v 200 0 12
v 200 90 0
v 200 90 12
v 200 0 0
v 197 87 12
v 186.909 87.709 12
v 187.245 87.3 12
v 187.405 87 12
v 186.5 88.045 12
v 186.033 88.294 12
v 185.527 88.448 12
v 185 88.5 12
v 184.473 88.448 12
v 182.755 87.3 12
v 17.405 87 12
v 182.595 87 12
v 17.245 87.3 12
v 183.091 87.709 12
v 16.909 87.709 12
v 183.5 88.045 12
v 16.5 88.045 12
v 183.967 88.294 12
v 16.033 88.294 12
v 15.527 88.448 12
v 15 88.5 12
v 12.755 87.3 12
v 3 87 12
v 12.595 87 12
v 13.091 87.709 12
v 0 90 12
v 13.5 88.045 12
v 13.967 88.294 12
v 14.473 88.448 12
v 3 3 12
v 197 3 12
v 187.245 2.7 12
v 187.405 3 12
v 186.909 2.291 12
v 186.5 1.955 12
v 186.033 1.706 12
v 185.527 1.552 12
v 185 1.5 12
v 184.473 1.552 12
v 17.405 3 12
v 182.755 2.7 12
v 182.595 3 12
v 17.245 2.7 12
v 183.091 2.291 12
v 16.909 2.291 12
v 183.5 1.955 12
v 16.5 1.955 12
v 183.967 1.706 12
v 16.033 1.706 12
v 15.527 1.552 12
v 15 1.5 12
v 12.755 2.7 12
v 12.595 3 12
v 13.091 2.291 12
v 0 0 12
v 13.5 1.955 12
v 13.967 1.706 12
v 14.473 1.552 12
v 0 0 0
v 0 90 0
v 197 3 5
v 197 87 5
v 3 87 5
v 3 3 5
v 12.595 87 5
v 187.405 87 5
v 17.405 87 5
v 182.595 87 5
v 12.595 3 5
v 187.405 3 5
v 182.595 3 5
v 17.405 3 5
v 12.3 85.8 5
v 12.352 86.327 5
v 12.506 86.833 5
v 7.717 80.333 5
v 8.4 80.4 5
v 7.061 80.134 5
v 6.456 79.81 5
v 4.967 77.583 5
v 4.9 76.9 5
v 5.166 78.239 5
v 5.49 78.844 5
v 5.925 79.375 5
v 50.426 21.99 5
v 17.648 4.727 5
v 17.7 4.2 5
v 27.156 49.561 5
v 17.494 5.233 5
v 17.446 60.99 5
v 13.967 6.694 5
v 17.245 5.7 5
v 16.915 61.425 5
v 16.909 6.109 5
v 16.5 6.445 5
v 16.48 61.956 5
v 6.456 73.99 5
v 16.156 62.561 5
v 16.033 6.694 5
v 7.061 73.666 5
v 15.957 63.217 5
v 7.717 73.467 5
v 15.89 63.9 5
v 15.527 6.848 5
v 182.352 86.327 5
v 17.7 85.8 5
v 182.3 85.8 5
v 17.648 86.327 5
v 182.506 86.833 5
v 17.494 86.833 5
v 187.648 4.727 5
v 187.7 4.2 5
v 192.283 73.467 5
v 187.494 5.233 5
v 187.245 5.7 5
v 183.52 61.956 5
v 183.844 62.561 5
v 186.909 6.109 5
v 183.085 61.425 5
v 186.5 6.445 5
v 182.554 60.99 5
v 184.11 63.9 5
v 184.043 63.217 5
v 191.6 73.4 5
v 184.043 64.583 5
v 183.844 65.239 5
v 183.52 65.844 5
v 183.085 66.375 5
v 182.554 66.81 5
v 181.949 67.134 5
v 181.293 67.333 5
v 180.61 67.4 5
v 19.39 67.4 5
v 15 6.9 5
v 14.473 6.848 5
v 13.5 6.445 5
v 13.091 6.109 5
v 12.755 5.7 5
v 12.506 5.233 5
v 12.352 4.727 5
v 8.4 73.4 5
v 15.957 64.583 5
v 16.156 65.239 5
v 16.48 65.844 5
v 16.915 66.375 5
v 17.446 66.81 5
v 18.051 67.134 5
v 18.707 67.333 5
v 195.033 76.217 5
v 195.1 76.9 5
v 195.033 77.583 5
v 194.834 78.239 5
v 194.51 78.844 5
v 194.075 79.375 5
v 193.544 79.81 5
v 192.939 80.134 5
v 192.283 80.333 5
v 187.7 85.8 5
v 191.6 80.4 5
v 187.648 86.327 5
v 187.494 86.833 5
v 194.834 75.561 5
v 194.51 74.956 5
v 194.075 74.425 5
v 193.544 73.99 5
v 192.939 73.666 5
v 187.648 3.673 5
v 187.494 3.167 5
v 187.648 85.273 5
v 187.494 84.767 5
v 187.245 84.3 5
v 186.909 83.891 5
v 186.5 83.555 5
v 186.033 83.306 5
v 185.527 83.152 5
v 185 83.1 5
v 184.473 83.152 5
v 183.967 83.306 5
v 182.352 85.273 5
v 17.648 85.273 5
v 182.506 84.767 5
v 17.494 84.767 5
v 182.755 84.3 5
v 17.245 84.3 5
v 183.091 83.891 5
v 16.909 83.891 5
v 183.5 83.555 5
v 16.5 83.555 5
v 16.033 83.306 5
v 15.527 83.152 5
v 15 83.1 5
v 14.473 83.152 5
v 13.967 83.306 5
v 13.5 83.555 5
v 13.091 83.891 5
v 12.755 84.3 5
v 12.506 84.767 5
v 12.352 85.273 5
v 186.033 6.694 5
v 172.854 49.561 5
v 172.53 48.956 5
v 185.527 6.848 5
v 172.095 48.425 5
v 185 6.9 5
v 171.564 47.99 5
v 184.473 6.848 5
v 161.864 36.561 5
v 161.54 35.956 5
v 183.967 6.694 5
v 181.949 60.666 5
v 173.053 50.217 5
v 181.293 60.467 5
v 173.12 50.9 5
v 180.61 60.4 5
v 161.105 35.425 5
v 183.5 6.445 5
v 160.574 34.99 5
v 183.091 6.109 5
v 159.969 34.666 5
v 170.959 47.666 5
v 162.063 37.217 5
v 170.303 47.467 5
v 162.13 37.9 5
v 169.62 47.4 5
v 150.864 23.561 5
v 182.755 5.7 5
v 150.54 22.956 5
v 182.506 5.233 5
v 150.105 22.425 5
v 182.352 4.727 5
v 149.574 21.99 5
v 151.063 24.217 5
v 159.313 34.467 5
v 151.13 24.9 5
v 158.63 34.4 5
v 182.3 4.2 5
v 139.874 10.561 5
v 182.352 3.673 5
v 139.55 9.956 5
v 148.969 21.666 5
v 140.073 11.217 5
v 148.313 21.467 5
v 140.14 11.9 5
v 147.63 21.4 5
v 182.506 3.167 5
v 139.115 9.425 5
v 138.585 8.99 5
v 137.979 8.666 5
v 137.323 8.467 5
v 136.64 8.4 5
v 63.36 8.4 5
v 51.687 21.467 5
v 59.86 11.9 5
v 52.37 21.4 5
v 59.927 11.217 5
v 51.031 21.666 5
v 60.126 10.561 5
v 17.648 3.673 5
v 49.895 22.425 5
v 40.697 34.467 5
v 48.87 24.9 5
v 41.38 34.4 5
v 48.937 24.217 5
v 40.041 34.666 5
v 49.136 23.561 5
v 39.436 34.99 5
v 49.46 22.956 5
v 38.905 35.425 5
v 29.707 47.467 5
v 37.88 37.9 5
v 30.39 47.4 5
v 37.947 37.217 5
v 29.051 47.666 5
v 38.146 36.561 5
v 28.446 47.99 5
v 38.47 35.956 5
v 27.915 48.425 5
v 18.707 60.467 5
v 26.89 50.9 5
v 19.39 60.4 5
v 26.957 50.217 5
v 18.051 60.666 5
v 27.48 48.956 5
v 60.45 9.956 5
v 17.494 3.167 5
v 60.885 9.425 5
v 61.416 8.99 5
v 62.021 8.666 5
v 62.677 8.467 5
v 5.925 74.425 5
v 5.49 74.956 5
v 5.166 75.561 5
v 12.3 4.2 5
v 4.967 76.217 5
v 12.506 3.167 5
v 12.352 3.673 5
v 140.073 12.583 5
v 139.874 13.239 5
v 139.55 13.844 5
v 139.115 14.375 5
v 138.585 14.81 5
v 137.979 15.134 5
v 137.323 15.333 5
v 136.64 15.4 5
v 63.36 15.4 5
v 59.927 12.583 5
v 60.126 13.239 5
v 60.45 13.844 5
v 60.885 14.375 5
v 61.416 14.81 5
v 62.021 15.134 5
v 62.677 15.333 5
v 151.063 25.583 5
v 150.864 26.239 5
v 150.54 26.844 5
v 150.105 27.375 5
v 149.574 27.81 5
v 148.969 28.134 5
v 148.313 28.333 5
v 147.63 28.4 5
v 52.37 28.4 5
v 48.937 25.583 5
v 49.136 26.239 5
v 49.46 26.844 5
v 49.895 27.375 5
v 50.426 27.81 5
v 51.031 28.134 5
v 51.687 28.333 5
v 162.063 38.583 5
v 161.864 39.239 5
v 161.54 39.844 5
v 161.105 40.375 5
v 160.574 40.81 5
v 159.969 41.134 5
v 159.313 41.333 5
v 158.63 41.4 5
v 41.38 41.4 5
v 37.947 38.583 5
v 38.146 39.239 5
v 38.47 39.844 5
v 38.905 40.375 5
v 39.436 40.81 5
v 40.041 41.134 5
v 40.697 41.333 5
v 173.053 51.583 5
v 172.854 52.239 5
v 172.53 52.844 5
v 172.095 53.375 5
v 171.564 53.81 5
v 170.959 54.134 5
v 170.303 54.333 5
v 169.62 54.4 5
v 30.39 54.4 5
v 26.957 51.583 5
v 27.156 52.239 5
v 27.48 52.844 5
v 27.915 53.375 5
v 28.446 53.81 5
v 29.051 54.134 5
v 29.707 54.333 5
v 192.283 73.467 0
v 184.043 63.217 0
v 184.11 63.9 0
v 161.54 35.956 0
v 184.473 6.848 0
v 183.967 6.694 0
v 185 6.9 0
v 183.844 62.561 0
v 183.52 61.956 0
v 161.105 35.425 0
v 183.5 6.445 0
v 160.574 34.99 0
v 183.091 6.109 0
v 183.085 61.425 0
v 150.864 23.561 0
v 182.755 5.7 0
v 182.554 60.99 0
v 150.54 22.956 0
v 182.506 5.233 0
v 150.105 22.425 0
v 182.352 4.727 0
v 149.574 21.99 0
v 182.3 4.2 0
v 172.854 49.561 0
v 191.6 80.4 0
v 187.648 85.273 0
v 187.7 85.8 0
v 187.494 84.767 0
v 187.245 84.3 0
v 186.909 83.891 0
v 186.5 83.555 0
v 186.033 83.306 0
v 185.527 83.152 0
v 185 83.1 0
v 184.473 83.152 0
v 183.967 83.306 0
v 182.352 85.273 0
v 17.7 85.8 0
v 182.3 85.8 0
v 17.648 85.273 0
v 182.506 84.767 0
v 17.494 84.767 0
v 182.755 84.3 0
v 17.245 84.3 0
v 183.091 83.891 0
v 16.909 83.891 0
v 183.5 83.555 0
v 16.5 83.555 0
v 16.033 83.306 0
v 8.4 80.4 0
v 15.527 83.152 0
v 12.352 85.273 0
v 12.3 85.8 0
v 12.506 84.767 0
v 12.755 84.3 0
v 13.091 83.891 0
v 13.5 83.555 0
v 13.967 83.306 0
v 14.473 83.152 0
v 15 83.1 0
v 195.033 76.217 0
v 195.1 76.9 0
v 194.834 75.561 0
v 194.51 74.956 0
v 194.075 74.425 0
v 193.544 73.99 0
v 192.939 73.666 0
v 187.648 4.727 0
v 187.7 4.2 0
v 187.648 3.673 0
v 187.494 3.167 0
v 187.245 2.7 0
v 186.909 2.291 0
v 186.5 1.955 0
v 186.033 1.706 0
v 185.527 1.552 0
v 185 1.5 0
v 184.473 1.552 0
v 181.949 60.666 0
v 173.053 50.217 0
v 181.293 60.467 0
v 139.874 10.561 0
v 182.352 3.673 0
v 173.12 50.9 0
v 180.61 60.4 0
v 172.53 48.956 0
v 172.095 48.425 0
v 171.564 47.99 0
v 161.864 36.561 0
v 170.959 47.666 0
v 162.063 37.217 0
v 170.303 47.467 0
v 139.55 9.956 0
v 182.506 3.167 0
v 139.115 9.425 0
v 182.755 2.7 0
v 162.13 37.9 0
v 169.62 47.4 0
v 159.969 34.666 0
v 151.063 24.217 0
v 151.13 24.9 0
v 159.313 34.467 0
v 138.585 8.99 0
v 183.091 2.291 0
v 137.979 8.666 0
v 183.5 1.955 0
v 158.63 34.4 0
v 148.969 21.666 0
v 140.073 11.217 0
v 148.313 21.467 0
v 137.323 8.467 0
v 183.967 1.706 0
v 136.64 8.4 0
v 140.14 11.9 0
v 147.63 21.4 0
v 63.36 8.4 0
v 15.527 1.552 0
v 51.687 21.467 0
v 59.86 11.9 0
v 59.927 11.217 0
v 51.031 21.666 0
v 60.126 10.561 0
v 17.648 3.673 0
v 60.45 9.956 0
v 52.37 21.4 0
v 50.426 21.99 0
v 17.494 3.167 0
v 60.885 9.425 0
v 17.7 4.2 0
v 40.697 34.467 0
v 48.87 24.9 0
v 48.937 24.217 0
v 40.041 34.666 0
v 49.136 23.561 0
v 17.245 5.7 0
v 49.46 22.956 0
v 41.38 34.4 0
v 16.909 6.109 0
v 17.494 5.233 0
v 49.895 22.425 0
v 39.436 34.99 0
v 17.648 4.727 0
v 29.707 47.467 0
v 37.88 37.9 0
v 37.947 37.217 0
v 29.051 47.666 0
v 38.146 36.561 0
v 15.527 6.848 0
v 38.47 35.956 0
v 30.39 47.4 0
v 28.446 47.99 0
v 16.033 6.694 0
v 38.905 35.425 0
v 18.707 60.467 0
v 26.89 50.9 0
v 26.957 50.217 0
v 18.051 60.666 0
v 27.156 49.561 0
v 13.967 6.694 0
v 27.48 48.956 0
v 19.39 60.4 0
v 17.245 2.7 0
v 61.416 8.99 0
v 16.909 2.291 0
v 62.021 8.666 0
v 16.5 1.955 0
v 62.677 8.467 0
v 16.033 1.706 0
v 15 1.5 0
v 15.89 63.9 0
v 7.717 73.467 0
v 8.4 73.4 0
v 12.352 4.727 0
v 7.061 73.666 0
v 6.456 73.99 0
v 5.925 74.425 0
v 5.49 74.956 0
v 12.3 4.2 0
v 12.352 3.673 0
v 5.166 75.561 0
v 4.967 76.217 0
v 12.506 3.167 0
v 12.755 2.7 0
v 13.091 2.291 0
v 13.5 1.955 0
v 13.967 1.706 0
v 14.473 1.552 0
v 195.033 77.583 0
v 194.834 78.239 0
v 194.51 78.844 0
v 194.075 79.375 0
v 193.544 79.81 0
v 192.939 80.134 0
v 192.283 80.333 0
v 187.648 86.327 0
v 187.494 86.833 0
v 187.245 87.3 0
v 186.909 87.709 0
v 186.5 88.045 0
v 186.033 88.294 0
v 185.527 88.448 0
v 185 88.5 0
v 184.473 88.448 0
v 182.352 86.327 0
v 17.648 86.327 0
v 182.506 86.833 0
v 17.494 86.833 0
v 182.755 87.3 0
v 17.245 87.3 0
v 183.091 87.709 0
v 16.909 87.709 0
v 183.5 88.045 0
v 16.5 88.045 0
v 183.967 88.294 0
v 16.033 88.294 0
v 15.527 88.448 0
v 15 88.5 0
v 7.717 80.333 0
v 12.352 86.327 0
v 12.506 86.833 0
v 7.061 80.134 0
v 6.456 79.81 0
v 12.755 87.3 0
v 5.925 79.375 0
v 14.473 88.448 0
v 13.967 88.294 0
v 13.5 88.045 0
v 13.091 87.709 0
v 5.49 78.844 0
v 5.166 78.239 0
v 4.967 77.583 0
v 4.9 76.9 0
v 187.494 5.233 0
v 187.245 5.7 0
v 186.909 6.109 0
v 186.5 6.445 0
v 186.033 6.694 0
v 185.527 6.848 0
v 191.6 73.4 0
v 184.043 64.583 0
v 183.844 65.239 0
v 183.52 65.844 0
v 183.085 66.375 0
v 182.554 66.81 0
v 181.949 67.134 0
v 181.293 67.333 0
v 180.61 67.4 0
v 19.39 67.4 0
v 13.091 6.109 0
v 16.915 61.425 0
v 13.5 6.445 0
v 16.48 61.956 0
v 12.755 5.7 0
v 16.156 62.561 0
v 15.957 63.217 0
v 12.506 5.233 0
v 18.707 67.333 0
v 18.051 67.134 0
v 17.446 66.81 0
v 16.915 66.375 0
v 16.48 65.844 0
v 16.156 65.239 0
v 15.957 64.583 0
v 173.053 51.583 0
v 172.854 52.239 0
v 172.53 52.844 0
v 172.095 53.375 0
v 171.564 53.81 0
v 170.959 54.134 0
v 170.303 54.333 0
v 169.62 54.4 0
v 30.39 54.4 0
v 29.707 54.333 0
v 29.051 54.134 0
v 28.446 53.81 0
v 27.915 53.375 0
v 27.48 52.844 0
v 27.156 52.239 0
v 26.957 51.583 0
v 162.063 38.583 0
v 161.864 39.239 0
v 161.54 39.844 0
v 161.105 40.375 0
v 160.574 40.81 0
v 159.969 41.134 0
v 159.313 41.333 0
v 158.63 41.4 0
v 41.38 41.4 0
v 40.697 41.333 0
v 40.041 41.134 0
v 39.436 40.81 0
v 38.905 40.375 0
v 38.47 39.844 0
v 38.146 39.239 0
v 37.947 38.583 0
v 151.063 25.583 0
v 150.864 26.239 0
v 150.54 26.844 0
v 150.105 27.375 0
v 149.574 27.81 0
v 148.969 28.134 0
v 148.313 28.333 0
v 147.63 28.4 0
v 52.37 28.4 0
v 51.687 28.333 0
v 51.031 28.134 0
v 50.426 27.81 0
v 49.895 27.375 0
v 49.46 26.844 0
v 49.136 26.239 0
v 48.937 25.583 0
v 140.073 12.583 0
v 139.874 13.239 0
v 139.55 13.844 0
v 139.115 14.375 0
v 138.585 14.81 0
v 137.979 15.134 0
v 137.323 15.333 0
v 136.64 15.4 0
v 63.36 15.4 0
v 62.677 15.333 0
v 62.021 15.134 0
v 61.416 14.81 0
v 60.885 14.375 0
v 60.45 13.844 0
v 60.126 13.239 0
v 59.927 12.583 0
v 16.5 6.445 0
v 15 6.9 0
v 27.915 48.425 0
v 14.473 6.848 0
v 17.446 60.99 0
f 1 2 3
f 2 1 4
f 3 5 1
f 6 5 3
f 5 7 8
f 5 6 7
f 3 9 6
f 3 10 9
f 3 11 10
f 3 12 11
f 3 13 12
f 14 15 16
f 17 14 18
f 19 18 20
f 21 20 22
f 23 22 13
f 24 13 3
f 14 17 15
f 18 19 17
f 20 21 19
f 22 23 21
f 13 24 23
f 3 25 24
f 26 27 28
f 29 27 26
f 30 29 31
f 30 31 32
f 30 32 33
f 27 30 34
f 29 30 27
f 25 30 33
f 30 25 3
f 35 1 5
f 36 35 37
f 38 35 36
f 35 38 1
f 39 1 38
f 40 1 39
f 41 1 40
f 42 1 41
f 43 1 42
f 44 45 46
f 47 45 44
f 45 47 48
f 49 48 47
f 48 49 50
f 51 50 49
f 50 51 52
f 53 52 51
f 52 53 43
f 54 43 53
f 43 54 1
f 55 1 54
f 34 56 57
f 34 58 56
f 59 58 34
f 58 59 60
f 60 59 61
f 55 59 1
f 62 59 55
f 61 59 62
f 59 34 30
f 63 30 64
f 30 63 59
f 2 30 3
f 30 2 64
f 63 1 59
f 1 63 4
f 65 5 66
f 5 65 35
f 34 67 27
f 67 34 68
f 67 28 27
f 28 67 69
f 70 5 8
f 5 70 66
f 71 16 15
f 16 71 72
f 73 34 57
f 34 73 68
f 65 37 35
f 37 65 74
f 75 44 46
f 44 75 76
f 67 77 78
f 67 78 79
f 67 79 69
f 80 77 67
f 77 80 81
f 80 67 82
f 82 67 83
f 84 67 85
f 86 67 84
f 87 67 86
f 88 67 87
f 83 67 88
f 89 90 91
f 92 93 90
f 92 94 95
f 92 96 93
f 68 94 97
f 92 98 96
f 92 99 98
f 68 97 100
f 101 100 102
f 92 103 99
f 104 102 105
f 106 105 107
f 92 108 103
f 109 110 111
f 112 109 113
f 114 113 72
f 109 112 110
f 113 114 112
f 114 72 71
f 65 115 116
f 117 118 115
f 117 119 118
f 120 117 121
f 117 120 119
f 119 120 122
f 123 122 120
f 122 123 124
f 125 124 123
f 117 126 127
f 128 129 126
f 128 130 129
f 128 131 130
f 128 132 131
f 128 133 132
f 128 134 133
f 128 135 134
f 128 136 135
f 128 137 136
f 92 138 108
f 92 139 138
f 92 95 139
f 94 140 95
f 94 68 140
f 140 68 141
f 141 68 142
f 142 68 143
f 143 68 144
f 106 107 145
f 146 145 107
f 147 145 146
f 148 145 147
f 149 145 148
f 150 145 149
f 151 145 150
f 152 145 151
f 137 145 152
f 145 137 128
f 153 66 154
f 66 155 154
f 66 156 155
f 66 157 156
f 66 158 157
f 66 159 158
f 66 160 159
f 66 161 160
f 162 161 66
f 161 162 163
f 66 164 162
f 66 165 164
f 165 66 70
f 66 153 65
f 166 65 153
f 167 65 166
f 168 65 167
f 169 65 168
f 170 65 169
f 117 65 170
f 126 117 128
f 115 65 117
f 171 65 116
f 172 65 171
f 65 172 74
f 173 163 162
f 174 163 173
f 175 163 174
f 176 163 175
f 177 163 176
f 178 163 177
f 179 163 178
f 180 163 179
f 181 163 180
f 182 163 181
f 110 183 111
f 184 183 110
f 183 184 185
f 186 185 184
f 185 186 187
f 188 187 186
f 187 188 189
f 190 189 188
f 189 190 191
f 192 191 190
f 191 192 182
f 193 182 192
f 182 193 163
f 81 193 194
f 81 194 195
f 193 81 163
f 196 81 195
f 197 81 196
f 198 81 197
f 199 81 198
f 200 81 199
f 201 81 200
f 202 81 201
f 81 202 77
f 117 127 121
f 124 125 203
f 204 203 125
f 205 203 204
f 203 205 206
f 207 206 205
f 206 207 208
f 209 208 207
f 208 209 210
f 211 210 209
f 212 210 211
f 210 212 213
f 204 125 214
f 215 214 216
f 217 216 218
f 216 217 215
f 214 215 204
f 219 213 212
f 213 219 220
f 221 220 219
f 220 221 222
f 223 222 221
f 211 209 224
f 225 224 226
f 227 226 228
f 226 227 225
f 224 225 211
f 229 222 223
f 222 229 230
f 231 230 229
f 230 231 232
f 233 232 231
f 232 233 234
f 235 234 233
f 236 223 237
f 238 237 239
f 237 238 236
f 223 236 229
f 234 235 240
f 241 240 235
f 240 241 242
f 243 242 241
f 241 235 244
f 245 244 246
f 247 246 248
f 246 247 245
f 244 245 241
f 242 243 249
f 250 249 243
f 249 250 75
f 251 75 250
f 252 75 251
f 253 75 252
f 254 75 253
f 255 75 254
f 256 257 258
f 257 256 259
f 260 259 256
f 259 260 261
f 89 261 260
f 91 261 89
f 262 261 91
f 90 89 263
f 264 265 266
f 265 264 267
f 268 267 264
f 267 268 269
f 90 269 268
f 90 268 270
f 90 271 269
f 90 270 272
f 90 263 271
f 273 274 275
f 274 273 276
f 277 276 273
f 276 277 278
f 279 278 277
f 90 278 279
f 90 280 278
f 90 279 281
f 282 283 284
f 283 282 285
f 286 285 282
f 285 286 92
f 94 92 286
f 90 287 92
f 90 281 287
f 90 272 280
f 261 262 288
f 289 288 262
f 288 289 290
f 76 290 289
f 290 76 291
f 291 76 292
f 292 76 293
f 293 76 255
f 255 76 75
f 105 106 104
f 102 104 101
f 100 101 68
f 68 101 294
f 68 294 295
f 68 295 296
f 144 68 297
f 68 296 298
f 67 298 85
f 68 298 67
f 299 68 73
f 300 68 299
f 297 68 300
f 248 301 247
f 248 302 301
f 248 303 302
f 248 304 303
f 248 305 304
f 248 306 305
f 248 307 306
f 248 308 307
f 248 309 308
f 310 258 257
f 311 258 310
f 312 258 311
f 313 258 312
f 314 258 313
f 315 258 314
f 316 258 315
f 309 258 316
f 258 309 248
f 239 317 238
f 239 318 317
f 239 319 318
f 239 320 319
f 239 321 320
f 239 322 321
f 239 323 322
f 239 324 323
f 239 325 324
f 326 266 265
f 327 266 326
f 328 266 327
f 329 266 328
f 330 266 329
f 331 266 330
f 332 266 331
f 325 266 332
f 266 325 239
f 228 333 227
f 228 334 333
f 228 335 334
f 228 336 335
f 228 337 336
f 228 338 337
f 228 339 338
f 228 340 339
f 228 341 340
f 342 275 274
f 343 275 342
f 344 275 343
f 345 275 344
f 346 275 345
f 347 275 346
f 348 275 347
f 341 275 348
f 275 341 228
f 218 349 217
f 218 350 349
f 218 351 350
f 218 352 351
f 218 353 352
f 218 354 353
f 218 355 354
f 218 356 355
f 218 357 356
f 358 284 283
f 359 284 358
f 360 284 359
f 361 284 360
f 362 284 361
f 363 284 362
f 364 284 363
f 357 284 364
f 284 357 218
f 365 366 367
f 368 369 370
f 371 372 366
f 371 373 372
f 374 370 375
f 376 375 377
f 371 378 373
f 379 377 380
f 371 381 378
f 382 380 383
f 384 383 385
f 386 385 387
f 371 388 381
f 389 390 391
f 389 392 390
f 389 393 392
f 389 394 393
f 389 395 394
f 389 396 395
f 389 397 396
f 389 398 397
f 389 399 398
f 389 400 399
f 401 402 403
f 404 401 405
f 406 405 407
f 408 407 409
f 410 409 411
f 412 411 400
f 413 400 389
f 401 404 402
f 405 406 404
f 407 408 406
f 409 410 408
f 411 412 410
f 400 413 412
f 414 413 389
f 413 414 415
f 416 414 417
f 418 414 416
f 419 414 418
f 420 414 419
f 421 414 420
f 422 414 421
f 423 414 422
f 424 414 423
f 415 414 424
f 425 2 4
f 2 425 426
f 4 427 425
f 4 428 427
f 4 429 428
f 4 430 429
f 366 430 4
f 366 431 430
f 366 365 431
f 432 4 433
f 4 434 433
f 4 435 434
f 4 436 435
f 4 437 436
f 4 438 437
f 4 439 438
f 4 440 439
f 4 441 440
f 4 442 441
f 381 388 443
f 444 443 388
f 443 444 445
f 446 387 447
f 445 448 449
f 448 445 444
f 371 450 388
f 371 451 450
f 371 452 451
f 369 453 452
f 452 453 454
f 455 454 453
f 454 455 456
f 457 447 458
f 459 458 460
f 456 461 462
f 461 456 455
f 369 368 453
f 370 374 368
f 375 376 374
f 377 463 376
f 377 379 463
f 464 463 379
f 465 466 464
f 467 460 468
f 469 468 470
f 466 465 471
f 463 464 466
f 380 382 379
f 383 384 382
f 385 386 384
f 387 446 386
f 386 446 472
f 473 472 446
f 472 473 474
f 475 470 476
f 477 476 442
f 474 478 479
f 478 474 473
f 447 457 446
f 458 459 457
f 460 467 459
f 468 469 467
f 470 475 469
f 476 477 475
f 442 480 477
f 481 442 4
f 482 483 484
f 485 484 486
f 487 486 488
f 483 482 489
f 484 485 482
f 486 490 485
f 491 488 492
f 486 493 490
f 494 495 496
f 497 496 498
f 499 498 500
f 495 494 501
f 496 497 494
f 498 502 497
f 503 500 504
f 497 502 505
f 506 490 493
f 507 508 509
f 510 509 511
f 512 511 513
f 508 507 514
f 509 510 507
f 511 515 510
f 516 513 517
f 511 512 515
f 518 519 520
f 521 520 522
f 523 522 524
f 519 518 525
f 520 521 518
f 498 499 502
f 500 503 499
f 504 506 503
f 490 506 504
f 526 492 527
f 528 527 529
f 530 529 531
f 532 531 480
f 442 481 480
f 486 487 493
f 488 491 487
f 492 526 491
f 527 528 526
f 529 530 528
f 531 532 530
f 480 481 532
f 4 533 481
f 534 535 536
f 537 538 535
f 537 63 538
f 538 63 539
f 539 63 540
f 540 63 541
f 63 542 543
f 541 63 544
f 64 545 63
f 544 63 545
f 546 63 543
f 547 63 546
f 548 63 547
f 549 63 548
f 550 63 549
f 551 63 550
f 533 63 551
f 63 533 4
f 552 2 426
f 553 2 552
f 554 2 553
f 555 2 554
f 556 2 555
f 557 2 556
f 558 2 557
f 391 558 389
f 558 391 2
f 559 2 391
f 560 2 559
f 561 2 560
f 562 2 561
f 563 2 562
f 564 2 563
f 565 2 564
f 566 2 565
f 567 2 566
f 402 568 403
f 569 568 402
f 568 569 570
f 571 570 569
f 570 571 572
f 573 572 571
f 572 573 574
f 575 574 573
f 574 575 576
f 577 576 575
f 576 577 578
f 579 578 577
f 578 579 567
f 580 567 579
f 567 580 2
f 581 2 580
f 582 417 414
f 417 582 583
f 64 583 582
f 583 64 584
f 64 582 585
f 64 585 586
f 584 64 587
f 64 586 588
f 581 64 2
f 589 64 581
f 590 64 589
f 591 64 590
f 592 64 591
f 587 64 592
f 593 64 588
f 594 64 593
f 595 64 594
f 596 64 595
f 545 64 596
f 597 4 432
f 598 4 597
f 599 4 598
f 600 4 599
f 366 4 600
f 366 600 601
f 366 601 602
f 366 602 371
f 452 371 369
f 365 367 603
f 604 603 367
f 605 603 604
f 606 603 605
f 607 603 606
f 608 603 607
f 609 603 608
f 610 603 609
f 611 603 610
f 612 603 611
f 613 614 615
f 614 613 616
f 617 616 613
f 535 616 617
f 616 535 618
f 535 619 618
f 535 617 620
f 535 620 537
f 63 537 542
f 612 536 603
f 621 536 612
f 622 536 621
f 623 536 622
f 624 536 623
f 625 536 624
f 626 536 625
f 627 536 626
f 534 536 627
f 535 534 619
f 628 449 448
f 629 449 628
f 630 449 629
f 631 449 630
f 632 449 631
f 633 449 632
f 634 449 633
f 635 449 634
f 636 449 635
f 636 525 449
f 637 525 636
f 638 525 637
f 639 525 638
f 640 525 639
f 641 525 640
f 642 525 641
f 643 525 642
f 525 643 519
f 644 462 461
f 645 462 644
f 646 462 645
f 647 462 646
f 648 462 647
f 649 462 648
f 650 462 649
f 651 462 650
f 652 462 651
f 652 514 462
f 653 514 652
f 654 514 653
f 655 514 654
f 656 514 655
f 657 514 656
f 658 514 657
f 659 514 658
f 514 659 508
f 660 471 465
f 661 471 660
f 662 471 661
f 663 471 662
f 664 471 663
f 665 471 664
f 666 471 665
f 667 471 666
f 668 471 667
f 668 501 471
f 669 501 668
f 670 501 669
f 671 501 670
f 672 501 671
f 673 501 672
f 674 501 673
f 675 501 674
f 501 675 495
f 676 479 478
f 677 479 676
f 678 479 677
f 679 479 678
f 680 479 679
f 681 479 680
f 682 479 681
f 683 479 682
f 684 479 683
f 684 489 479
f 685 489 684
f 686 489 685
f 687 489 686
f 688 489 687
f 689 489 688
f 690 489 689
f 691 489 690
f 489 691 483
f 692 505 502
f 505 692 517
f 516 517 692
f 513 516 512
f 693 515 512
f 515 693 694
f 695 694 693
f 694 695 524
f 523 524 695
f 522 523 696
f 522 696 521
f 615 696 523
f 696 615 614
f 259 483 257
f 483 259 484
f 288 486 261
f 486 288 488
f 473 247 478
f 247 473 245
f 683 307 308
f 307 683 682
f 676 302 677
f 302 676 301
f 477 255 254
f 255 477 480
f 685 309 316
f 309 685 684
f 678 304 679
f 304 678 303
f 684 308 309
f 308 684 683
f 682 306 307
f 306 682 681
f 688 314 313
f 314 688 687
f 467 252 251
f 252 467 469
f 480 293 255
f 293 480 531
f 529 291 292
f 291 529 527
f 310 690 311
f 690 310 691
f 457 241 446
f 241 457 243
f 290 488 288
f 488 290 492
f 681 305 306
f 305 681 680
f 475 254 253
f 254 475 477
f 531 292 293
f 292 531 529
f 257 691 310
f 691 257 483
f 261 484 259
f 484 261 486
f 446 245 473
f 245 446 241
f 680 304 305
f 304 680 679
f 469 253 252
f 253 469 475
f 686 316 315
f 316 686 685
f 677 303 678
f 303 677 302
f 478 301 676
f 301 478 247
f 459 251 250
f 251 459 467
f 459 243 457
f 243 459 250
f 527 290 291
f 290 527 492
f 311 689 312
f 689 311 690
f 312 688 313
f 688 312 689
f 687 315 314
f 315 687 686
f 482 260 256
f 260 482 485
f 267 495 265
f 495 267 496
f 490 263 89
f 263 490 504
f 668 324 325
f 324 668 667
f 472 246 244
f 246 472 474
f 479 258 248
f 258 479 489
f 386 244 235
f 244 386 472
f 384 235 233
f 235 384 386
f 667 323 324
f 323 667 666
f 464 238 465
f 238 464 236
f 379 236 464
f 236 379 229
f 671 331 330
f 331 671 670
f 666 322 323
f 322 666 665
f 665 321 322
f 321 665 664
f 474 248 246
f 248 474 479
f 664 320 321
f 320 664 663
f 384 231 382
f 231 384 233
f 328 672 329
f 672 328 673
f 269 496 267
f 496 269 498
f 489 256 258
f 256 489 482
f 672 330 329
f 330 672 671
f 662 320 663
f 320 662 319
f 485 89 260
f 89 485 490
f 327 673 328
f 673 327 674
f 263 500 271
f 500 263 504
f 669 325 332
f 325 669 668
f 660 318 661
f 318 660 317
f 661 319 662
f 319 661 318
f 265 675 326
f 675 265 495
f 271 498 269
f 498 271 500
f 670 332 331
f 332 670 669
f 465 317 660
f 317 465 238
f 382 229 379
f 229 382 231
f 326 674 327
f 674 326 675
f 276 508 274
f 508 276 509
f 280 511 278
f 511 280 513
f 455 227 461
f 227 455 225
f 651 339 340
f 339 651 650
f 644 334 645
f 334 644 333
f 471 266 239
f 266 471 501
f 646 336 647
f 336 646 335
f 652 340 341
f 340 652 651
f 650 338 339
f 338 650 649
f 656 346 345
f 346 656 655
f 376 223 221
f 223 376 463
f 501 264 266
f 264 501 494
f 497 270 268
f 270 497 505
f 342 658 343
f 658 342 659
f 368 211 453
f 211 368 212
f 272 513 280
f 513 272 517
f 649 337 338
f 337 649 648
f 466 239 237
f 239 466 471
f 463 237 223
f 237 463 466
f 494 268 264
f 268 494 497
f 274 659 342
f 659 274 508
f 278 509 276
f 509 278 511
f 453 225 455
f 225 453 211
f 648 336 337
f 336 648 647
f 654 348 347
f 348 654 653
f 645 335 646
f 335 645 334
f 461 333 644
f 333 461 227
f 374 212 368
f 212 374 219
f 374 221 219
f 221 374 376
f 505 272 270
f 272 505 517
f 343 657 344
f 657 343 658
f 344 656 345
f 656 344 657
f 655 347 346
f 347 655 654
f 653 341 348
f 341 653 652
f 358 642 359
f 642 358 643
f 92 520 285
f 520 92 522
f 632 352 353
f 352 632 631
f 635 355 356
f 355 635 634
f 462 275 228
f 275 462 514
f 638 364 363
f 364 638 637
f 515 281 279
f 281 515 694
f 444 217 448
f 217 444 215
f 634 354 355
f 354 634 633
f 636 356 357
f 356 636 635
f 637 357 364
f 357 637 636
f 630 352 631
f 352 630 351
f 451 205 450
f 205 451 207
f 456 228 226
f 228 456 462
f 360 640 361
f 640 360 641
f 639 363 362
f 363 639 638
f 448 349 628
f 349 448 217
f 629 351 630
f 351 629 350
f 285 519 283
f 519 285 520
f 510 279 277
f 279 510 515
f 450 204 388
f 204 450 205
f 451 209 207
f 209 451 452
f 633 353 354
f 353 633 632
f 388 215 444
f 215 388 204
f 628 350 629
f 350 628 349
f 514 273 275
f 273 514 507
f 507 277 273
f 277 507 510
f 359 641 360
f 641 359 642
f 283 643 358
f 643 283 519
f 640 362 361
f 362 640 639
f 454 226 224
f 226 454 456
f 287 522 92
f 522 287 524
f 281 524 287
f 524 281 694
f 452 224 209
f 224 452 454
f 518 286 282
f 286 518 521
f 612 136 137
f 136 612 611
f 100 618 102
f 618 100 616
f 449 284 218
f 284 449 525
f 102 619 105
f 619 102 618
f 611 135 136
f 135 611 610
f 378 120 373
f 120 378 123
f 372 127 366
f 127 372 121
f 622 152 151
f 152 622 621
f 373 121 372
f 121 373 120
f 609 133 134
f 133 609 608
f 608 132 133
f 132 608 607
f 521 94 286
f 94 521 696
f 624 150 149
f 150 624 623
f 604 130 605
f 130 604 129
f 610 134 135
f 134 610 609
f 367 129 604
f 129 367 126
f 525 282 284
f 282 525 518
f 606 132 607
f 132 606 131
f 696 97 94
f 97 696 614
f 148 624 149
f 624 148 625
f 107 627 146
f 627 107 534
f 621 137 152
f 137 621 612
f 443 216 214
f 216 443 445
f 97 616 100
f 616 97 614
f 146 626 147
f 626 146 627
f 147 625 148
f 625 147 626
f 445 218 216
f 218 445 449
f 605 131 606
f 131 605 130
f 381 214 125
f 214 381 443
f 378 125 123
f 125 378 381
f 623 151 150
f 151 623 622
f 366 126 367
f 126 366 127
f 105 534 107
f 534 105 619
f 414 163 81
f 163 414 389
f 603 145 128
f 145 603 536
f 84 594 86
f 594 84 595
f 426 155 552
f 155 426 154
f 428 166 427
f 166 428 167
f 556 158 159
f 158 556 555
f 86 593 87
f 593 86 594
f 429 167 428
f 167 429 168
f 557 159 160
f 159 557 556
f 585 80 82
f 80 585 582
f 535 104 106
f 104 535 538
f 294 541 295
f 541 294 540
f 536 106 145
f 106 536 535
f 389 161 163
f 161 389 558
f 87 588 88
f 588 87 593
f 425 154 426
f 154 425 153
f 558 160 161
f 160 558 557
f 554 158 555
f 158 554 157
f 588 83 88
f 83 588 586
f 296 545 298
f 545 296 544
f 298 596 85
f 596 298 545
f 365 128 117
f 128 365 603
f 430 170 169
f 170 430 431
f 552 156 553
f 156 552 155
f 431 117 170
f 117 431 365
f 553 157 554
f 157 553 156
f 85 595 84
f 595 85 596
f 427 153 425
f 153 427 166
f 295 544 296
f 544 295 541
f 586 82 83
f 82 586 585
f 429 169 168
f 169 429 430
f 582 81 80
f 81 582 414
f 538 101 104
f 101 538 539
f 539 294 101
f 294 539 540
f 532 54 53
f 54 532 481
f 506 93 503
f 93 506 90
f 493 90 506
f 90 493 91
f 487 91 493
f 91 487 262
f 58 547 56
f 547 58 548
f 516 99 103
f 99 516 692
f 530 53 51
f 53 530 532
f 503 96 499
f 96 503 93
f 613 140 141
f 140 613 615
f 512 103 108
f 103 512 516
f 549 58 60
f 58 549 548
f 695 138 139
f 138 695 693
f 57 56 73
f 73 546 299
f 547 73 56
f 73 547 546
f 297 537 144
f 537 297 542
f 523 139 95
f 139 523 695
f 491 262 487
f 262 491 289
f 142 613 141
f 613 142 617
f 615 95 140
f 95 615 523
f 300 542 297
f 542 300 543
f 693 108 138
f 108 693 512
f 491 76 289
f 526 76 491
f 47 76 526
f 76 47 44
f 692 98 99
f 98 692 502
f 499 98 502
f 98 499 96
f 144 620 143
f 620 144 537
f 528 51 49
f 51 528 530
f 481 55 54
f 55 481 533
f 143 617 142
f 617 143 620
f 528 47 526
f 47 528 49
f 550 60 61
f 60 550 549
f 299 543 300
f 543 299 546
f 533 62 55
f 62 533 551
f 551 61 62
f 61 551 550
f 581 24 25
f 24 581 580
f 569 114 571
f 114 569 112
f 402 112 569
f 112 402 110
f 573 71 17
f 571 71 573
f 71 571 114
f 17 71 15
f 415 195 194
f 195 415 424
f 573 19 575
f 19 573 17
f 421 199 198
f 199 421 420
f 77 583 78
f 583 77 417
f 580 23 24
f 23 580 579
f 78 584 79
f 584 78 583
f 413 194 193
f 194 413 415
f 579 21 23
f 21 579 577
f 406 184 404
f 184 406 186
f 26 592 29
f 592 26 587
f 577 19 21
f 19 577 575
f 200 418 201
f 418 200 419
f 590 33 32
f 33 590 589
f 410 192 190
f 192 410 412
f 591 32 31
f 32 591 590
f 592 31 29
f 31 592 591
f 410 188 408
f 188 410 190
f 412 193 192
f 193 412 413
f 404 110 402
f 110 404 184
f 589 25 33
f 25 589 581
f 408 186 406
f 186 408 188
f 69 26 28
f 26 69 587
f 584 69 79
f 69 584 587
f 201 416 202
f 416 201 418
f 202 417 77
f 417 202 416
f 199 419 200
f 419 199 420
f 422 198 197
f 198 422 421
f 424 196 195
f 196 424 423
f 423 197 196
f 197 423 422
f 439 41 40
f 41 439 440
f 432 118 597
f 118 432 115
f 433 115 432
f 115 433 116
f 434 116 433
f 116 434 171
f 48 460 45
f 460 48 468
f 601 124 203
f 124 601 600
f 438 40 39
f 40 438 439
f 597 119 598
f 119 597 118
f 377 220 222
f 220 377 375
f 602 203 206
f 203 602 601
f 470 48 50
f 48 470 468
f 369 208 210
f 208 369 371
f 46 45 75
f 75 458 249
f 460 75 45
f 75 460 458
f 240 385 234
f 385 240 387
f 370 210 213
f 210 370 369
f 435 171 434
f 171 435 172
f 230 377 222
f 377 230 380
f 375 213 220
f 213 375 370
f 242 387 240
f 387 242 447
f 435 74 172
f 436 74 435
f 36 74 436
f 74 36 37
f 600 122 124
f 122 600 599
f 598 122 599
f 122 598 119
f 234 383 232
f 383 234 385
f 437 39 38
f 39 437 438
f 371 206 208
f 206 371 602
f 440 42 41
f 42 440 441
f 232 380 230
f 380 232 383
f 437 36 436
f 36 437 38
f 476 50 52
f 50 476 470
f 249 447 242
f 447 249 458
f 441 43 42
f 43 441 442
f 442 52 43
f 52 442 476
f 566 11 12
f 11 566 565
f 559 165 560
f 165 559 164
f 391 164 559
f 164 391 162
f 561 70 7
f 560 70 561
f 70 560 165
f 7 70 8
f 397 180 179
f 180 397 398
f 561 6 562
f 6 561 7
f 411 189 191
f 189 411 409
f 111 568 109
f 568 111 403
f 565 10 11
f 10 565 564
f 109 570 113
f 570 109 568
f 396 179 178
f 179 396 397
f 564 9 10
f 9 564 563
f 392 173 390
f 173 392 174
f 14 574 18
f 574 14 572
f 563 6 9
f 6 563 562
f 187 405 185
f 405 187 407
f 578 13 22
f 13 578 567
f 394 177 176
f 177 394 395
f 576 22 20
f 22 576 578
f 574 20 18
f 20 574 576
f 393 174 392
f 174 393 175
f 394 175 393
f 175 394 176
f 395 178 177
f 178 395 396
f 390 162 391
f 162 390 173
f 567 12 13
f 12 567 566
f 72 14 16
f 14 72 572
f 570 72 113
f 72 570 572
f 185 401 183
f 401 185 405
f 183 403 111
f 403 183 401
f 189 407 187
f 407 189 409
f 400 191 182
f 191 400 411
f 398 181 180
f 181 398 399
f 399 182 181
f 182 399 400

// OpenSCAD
$fn = 32;

// ----------------------------------------------------------------------
// Slotted panel: 200 x 90 mm, 6 рядов of slots
// ----------------------------------------------------------------------

// --- parameters (mm) ---
panel_w = 200;            // panel width
panel_d = 90;             // panel depth
thick = 5;                // panel thickness
slot_w = 7;               // slot width
pitch0 = 13;              // first row pitch
pitch_step = 2.4;         // pitch increase per row
margin = 8.4;             // margin around the slot field
rows = 6;                 // number of slot rows
mount_d = 5.4;            // mounting holes
mount_x = 85;             // mounting hole offset
rim_h = 12;               // rim height
rim_t = 3;                // rim wall thickness

difference() {
  union() {
    cube([panel_w, panel_d, thick]);
    translate([0, 0, thick - 1]) difference() {
      cube([panel_w, panel_d, rim_h - thick + 1]);
      translate([rim_t, rim_t, -2.5]) cube([panel_w - 2 * rim_t, panel_d - 2 * rim_t, rim_h - thick + 6]);
    }
  }
  /* slot rows: stadium shaped cutters, 2.5 mm clear of both faces */
  /* row 0: pitch 13, length 73.28 */
  hull() {
    translate([63.36, 11.9, -2.5]) cylinder(h = thick + 5, d = slot_w);
    translate([136.64, 11.9, -2.5]) cylinder(h = thick + 5, d = slot_w);
  }
  /* row 1: pitch 13, length 95.26 */
  hull() {
    translate([52.37, 24.9, -2.5]) cylinder(h = thick + 5, d = slot_w);
    translate([147.63, 24.9, -2.5]) cylinder(h = thick + 5, d = slot_w);
  }
  /* row 2: pitch 13, length 117.25 */
  hull() {
    translate([41.38, 37.9, -2.5]) cylinder(h = thick + 5, d = slot_w);
    translate([158.63, 37.9, -2.5]) cylinder(h = thick + 5, d = slot_w);
  }
  /* row 3: pitch 13, length 139.23 */
  hull() {
    translate([30.39, 50.9, -2.5]) cylinder(h = thick + 5, d = slot_w);
    translate([169.62, 50.9, -2.5]) cylinder(h = thick + 5, d = slot_w);
  }
  /* row 4: pitch 13, length 161.22 */
  hull() {
    translate([19.39, 63.9, -2.5]) cylinder(h = thick + 5, d = slot_w);
    translate([180.61, 63.9, -2.5]) cylinder(h = thick + 5, d = slot_w);
  }
  /* row 5: pitch 13, length 183.2 */
  hull() {
    translate([8.4, 76.9, -2.5]) cylinder(h = thick + 5, d = slot_w);
    translate([191.6, 76.9, -2.5]) cylinder(h = thick + 5, d = slot_w);
  }
  translate([15, 4.2, -2.5]) cylinder(h = 17, d = mount_d);
  translate([15, 85.8, -2.5]) cylinder(h = 17, d = mount_d);
  translate([185, 4.2, -2.5]) cylinder(h = 17, d = mount_d);
  translate([185, 85.8, -2.5]) cylinder(h = 17, d = mount_d);
}
